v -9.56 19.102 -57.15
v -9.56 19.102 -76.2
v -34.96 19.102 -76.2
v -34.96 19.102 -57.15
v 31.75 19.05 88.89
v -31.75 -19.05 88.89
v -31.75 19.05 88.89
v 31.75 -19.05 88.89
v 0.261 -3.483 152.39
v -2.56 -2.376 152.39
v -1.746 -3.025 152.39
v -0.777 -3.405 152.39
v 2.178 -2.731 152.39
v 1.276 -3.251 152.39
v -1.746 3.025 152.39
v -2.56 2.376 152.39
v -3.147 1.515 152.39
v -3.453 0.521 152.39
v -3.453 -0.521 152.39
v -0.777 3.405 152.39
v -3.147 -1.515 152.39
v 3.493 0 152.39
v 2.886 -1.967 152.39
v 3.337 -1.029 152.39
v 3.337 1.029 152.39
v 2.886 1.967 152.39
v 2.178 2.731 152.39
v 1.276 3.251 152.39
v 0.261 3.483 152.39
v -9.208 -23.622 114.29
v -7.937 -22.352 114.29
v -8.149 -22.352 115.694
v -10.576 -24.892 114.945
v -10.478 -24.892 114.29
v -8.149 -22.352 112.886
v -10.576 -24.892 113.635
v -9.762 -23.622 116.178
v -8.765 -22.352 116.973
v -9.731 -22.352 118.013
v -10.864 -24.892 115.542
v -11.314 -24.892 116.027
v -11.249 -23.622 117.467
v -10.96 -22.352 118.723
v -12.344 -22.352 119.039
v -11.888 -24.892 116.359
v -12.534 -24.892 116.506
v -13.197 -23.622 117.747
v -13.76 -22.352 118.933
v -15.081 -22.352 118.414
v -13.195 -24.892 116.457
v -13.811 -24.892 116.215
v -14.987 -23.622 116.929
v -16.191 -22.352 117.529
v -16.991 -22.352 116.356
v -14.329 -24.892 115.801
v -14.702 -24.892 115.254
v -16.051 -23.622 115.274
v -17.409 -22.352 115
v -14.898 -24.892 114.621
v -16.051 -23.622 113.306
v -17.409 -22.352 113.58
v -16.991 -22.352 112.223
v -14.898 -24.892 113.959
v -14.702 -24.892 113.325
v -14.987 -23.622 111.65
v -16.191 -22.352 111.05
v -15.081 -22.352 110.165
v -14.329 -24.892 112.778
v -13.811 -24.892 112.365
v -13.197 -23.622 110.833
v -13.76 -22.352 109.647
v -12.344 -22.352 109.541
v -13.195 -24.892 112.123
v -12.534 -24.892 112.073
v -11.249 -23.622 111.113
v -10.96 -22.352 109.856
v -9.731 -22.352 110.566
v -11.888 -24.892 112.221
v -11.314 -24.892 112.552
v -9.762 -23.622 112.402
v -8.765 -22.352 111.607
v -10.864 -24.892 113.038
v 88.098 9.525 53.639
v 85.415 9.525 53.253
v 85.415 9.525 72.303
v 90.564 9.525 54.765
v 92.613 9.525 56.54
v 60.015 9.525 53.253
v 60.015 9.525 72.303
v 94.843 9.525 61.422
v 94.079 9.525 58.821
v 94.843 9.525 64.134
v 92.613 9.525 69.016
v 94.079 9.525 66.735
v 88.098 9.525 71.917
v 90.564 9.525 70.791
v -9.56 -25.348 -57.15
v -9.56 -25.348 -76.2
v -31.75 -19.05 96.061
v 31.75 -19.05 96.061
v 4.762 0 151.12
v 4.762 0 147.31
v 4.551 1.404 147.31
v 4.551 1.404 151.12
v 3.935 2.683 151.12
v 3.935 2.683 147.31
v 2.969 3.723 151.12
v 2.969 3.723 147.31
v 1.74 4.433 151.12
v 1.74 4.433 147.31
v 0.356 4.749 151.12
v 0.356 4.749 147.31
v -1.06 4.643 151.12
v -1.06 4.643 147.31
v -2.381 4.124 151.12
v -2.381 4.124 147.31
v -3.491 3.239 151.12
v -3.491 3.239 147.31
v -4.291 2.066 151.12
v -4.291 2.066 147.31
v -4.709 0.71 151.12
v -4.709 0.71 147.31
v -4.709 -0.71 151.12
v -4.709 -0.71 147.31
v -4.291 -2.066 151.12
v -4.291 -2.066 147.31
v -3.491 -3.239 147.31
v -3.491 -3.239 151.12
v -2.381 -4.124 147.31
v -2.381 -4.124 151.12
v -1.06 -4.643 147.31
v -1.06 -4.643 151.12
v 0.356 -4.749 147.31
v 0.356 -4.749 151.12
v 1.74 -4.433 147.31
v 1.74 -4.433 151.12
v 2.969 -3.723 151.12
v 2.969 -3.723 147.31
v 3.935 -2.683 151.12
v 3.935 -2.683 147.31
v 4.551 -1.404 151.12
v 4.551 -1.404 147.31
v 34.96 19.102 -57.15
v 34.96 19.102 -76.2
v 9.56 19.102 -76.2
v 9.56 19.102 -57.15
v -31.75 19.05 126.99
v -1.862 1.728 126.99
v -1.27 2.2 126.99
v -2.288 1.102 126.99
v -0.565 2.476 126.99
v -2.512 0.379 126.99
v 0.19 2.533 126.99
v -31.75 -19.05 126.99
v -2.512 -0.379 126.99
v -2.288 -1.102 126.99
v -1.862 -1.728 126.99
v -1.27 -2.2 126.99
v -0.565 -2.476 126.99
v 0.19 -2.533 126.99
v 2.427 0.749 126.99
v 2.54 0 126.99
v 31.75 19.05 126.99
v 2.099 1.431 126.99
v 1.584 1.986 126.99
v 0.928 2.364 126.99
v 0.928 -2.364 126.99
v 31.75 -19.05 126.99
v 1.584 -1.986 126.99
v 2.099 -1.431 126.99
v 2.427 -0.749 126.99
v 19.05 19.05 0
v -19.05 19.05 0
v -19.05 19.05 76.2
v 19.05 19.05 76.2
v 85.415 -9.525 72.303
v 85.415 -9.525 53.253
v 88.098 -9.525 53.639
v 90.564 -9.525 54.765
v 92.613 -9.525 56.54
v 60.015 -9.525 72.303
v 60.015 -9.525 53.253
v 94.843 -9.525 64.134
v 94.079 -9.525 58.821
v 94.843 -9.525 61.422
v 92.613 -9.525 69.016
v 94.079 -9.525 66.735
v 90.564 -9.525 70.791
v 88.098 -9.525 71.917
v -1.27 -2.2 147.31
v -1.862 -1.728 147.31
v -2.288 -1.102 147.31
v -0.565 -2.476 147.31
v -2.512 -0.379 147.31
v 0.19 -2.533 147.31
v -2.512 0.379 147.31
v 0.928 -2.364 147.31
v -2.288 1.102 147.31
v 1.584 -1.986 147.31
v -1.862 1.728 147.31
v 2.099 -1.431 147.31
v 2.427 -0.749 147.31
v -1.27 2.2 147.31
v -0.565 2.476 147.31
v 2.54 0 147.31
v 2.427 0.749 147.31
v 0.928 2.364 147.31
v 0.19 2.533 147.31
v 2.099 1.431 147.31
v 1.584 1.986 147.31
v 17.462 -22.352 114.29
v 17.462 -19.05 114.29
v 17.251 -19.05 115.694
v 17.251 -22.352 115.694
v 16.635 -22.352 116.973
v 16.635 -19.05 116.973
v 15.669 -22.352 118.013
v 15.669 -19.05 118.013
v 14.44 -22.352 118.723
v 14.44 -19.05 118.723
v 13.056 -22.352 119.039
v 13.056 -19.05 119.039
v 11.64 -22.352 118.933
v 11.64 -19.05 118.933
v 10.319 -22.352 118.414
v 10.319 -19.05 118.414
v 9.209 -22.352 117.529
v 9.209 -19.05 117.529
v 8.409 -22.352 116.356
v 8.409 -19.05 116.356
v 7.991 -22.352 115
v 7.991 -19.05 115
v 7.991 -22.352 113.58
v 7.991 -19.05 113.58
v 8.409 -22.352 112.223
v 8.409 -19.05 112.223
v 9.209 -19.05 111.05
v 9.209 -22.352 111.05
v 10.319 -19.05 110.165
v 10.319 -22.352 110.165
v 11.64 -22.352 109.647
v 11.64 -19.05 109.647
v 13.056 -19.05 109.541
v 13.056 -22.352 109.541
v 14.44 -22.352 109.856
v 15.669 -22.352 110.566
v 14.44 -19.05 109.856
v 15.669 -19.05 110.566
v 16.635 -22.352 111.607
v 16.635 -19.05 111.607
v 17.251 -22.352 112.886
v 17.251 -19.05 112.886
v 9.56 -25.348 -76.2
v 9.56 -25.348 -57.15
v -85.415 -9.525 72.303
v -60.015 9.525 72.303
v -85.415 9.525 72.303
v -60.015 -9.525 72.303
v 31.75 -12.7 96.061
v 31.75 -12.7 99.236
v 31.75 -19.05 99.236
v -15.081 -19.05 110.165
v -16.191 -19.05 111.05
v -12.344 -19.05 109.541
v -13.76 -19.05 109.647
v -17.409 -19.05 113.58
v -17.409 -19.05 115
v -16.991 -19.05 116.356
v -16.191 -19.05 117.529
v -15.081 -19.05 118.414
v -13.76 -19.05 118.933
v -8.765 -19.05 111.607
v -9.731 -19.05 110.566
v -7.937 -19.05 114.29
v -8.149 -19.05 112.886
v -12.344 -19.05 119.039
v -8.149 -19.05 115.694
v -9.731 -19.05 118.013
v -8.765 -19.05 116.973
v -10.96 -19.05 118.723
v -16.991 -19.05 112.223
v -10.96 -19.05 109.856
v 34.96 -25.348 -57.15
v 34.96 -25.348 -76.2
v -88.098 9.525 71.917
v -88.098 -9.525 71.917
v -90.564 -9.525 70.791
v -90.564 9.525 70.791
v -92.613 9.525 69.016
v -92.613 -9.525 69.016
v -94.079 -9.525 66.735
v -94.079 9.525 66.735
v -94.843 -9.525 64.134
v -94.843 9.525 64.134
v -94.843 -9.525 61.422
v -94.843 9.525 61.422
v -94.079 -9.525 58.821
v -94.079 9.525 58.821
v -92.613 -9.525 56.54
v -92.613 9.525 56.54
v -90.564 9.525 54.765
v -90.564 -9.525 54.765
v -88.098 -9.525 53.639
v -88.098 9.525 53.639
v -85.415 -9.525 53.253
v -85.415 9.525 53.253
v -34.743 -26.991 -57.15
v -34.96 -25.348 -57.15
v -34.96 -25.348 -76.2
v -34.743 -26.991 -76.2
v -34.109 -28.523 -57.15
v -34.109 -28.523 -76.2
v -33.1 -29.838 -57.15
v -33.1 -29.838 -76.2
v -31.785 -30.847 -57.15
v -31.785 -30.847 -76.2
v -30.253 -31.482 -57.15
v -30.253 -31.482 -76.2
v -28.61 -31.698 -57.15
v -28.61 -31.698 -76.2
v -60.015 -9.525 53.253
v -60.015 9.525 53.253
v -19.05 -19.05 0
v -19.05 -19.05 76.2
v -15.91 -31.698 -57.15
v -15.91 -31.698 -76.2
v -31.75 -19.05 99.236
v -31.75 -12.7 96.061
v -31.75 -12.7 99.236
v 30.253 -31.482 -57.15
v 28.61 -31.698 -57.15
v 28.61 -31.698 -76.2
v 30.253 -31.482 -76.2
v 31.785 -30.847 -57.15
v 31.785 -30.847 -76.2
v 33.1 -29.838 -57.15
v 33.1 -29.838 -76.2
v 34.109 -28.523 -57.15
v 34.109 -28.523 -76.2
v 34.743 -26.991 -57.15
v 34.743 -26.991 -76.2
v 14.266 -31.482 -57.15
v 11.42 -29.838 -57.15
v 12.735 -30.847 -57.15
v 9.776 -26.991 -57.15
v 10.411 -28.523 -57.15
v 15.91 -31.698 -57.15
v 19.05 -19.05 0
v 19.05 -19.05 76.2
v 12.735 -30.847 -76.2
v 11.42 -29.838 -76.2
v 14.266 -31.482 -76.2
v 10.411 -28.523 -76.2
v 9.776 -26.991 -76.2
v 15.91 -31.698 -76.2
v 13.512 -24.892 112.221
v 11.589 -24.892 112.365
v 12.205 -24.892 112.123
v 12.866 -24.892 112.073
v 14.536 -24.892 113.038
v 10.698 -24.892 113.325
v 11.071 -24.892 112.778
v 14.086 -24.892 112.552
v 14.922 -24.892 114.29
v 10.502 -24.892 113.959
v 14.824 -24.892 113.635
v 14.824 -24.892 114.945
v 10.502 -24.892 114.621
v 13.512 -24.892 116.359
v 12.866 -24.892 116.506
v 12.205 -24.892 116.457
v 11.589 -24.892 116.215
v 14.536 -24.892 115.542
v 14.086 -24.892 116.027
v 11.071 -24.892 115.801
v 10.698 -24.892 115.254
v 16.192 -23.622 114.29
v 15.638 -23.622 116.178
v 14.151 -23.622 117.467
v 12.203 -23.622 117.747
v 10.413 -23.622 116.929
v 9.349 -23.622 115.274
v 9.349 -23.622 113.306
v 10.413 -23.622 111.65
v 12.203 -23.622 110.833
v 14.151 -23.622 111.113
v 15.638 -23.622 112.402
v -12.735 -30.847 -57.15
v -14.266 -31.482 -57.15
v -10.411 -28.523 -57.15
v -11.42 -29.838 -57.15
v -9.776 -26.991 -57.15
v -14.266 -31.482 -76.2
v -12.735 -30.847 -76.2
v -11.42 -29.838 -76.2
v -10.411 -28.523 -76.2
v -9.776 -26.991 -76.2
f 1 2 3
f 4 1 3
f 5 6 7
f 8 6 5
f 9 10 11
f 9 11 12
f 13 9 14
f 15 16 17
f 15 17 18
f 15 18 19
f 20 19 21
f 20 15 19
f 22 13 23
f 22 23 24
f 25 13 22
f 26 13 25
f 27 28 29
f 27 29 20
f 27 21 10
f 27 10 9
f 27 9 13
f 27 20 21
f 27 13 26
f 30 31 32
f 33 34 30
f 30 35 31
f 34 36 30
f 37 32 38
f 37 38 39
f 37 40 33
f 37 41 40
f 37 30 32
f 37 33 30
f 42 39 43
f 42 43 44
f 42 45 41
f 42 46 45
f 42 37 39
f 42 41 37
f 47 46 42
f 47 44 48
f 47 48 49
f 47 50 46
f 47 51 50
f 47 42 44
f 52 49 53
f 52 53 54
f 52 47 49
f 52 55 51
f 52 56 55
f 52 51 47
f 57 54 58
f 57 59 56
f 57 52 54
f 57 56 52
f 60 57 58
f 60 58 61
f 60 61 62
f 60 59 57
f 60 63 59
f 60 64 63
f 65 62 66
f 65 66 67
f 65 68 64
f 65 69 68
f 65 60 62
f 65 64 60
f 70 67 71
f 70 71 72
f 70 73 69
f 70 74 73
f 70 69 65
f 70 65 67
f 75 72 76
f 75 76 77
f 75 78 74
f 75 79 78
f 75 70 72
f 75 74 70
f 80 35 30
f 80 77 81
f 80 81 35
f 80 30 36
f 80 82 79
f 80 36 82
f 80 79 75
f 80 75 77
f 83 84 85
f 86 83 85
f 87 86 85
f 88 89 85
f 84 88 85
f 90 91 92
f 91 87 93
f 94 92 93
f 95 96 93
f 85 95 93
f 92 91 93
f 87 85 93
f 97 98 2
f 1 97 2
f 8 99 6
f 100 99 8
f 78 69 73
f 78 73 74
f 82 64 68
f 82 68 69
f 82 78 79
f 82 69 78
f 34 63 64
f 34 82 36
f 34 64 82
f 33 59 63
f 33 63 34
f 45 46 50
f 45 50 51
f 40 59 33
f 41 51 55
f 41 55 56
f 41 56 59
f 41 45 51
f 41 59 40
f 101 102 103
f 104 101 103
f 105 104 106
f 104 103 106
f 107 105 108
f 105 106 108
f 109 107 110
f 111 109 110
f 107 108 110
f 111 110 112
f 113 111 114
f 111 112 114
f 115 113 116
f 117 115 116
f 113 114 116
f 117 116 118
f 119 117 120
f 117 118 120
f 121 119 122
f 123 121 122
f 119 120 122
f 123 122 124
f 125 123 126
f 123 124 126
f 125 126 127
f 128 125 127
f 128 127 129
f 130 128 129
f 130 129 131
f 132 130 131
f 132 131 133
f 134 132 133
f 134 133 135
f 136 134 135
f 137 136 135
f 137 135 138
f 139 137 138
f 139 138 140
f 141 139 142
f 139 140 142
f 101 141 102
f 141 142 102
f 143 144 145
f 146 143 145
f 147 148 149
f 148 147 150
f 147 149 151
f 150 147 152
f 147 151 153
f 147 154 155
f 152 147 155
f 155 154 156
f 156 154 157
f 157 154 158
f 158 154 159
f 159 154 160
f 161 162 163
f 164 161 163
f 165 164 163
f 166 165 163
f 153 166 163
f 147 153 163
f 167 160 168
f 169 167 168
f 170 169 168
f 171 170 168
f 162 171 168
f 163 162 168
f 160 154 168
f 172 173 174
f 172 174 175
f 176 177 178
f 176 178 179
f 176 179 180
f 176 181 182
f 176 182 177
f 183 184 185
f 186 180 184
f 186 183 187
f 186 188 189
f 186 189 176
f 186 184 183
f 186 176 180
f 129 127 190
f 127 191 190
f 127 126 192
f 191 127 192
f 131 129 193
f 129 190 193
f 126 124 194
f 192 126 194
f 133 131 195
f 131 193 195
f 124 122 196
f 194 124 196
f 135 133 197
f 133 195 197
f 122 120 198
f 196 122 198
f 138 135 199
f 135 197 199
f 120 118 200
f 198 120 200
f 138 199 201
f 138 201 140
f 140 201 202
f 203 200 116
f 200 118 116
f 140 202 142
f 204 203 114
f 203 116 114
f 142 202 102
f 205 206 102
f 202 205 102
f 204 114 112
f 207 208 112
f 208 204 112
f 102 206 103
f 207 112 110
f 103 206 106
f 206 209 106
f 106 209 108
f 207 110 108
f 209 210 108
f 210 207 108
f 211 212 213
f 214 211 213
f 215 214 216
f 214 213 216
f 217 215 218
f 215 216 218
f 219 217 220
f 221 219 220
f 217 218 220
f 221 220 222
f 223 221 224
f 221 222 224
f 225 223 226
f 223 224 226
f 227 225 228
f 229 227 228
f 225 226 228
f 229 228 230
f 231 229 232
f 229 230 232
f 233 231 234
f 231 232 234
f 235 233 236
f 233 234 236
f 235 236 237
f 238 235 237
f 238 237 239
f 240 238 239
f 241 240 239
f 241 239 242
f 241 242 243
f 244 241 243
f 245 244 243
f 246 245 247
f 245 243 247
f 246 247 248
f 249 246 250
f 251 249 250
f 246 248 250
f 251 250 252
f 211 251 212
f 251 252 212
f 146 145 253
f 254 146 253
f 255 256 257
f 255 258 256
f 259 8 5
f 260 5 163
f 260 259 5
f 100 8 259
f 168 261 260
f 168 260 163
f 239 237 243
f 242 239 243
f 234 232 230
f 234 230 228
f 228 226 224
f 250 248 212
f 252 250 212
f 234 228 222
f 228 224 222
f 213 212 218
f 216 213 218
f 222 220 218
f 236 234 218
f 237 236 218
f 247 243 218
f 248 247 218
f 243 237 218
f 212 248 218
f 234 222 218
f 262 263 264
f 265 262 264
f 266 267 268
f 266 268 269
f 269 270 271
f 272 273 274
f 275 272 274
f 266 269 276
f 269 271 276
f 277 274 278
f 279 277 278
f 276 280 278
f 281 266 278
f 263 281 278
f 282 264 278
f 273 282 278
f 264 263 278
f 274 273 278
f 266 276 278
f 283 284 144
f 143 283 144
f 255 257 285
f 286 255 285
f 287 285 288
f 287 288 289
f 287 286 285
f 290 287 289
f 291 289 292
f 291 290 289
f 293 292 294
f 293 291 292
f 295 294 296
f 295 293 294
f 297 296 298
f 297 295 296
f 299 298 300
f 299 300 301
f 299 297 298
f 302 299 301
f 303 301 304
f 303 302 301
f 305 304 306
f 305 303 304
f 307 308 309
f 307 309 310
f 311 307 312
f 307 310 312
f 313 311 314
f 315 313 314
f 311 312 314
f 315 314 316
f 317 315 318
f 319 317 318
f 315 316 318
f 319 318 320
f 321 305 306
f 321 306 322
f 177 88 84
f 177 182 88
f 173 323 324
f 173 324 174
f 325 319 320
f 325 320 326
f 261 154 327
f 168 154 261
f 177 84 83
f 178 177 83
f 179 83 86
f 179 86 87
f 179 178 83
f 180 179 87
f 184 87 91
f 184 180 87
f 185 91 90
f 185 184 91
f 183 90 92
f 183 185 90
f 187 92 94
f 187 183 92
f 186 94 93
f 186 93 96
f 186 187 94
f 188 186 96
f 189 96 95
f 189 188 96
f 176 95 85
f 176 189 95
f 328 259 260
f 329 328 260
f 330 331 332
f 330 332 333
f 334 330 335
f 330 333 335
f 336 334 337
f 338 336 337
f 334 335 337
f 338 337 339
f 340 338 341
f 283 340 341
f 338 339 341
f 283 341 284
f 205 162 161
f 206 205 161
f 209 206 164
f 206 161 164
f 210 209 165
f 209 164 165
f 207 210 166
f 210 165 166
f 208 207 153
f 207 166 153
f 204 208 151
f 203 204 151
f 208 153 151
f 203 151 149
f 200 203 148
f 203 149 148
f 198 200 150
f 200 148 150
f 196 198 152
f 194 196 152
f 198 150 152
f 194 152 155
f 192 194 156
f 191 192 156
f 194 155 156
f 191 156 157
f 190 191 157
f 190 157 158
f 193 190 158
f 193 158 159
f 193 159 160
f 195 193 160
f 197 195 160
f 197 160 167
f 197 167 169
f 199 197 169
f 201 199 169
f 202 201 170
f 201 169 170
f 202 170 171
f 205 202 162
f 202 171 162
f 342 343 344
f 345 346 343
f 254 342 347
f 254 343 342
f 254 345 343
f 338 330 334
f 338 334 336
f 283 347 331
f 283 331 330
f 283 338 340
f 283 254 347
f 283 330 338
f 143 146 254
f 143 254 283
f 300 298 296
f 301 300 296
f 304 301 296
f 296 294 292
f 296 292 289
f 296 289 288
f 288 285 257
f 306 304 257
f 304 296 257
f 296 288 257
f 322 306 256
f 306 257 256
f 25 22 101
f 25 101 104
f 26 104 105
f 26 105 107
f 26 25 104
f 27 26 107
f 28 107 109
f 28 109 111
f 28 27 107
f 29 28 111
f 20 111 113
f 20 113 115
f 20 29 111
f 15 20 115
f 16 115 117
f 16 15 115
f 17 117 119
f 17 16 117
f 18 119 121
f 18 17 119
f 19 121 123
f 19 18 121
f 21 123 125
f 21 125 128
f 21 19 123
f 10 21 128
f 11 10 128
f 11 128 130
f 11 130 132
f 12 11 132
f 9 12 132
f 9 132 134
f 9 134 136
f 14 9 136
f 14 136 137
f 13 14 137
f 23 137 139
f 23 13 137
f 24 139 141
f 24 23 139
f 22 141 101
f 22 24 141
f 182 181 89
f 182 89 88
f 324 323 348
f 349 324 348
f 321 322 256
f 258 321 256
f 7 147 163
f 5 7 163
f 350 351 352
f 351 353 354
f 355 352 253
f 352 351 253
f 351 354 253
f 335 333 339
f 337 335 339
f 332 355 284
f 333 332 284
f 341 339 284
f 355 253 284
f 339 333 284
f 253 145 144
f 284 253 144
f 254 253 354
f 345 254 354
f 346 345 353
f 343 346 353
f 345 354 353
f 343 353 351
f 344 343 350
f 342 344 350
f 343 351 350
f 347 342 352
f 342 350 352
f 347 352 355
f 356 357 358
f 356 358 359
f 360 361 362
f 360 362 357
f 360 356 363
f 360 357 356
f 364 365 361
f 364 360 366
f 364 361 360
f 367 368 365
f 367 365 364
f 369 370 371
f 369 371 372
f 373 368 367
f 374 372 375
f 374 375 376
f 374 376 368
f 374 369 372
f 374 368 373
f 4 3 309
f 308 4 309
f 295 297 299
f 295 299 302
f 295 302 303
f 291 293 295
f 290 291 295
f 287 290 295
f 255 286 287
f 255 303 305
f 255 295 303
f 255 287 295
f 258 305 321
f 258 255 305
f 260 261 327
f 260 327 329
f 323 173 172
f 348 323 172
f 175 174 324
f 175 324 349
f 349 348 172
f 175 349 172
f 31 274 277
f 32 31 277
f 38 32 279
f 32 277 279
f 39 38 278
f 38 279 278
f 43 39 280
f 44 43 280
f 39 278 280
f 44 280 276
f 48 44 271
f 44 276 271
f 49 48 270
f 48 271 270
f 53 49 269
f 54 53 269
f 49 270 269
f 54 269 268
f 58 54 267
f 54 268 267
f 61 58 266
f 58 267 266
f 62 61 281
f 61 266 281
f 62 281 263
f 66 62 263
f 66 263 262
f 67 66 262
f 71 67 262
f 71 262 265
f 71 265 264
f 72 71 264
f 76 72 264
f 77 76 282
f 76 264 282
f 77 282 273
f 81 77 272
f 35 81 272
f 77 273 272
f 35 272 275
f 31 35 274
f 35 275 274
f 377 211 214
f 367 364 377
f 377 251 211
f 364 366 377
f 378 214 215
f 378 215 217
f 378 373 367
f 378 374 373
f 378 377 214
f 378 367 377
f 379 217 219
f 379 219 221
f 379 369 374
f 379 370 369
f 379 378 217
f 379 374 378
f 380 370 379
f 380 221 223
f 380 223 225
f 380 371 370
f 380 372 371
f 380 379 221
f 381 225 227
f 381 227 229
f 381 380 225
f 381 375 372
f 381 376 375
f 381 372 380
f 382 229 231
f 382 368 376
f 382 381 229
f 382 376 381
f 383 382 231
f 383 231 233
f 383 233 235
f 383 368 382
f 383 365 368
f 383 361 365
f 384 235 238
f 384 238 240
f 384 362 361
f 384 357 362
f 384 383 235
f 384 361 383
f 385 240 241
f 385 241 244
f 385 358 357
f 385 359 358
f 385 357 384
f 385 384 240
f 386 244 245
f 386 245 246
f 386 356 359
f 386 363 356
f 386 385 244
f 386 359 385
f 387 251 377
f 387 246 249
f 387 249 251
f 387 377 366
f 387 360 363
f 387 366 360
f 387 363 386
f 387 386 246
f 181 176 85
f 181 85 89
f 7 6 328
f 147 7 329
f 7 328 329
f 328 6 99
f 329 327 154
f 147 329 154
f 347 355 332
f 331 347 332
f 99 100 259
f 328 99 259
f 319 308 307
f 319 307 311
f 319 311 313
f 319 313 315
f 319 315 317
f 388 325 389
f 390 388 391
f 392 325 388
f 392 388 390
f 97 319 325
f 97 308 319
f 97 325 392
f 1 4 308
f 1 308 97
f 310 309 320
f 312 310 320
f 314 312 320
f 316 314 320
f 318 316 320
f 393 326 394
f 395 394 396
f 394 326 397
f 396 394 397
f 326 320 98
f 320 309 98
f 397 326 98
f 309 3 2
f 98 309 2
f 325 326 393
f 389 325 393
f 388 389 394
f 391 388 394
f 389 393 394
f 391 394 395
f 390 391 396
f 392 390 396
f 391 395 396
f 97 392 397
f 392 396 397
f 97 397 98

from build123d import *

# Parameters (mm, degrees)
F0_W           = 38.1
F0_H           = 38.099996
F1_DEPTH       = 76.2
F2_W           = 63.5
F2_H           = 38.1
F3_DEPTH       = 19.05
F3_DEPTH_BACK  = 19.05
F4_W           = 6.35
F4_H           = 3.175
F5_DEPTH       = 63.501
F6_R           = 4.7625
F7_DEPTH       = 5.842
F8_SIZE        = 2.54
F9_R           = 2.54
F10_DEPTH      = 20.32
F11_R          = 4.7625
F11_R_2        = 2.54
F12_DEPTH      = 5.08
F13_SIZE       = 1.27
F16_DEPTH      = 19.05
F18_DEPTH      = 9.525
F18_DEPTH_BACK = 9.525


with BuildPart() as f1:
    # F0 (on Top) → F1 (new body)
    with BuildSketch(Plane.XY):
        Rectangle(F0_W, F0_H)
    extrude(amount=F1_DEPTH)


with BuildPart() as f3:
    # F2 (on Front) → F3 (new body, two sides)
    with BuildSketch(Plane.XZ) as f3_sk:
        with Locations((0, 107.939761)):
            Rectangle(F2_W, F2_H)
    extrude(amount=F3_DEPTH)
    extrude(f3_sk.sketch, amount=-F3_DEPTH_BACK)

    # F4 (on face) → F5 (cut, through all)
    with BuildSketch(Plane.YZ.offset(31.75)):
        with Locations((-15.875, 97.648171)):
            Rectangle(F4_W, F4_H)
    extrude(amount=-F5_DEPTH, mode=Mode.SUBTRACT)

    # F9 (on face) → F10 (join)
    with BuildSketch(Plane.XY.offset(126.989761)):
        Circle(F9_R)
    extrude(amount=F10_DEPTH)

    # F11 (on face) → F12 (join)
    with BuildSketch(Plane.XY.offset(147.309761)):
        Circle(F11_R)
        Circle(F11_R_2, mode=Mode.SUBTRACT)
        Circle(F11_R_2)
    extrude(amount=F12_DEPTH)

    # F13
    f13_edges = [f3.edges().sort_by_distance(p)[0] for p in [
        (-4.7625, 0, 152.389761),
    ]]
    chamfer(f13_edges, length=F13_SIZE)


with BuildPart() as f7:
    # F6 (on face) → F7 (new body)
    with BuildSketch(Plane.XZ.offset(19.05)):
        with Locations((-12.7, 114.289761)):
            Circle(F6_R)
        with Locations((12.7, 114.289761)):
            Circle(F6_R)
    extrude(amount=F7_DEPTH)

    # F8
    f8_edges = [f7.edges().sort_by_distance(p)[0] for p in [
        (-17.4625, -24.892, 114.289761),
        (7.9375, -24.892, 114.289761),
    ]]
    chamfer(f8_edges, length=F8_SIZE)


with BuildPart() as f16:
    # F15 (on offset) → F16 (new body)
    with BuildSketch(Plane.XY.offset(-76.2)):
        with BuildLine():
            ThreePointArc((-34.959849, -25.34791), (-33.099977, -29.838038), (-28.609849, -31.69791))
            Line((-28.609849, -31.69791), (-15.909849, -31.69791))
            ThreePointArc((-15.909849, -31.69791), (-11.419721, -29.838038), (-9.559849, -25.34791))
            Line((-9.559849, -25.34791), (-9.559849, 19.10209))
            Line((-9.559849, 19.10209), (-34.959849, 19.10209))
            Line((-34.959849, 19.10209), (-34.959849, -25.34791))
        make_face()
        with BuildLine():
            Line((34.959849, -25.34791), (34.959849, 19.10209))
            Line((34.959849, 19.10209), (9.559849, 19.10209))
            Line((9.559849, 19.10209), (9.559849, -25.34791))
            ThreePointArc((9.559849, -25.34791), (11.419721, -29.838038), (15.909849, -31.69791))
            Line((15.909849, -31.69791), (28.609849, -31.69791))
            ThreePointArc((28.609849, -31.69791), (33.099977, -29.838038), (34.959849, -25.34791))
        make_face()
    extrude(amount=F16_DEPTH)


with BuildPart() as f18:
    # F17 (on Front) → F18 (new body, two sides)
    with BuildSketch(Plane.XZ) as f18_sk:
        with BuildLine():
            Line((-60.014771, 72.302995), (-85.414771, 72.302995))
            ThreePointArc((-85.414771, 72.302995), (-94.939771, 62.777995), (-85.414771, 53.252995))
            Line((-85.414771, 53.252995), (-60.014771, 53.252995))
            Line((-60.014771, 53.252995), (-60.014771, 72.302995))
        make_face()
        with BuildLine():
            ThreePointArc((85.414771, 53.252995), (94.939771, 62.777995), (85.414771, 72.302995))
            Line((85.414771, 72.302995), (60.014771, 72.302995))
            Line((60.014771, 72.302995), (60.014771, 53.252995))
            Line((60.014771, 53.252995), (85.414771, 53.252995))
        make_face()
    extrude(amount=F18_DEPTH)
    extrude(f18_sk.sketch, amount=-F18_DEPTH_BACK)


solid = Compound([f1.part, f3.part, f7.part, f16.part, f18.part])
